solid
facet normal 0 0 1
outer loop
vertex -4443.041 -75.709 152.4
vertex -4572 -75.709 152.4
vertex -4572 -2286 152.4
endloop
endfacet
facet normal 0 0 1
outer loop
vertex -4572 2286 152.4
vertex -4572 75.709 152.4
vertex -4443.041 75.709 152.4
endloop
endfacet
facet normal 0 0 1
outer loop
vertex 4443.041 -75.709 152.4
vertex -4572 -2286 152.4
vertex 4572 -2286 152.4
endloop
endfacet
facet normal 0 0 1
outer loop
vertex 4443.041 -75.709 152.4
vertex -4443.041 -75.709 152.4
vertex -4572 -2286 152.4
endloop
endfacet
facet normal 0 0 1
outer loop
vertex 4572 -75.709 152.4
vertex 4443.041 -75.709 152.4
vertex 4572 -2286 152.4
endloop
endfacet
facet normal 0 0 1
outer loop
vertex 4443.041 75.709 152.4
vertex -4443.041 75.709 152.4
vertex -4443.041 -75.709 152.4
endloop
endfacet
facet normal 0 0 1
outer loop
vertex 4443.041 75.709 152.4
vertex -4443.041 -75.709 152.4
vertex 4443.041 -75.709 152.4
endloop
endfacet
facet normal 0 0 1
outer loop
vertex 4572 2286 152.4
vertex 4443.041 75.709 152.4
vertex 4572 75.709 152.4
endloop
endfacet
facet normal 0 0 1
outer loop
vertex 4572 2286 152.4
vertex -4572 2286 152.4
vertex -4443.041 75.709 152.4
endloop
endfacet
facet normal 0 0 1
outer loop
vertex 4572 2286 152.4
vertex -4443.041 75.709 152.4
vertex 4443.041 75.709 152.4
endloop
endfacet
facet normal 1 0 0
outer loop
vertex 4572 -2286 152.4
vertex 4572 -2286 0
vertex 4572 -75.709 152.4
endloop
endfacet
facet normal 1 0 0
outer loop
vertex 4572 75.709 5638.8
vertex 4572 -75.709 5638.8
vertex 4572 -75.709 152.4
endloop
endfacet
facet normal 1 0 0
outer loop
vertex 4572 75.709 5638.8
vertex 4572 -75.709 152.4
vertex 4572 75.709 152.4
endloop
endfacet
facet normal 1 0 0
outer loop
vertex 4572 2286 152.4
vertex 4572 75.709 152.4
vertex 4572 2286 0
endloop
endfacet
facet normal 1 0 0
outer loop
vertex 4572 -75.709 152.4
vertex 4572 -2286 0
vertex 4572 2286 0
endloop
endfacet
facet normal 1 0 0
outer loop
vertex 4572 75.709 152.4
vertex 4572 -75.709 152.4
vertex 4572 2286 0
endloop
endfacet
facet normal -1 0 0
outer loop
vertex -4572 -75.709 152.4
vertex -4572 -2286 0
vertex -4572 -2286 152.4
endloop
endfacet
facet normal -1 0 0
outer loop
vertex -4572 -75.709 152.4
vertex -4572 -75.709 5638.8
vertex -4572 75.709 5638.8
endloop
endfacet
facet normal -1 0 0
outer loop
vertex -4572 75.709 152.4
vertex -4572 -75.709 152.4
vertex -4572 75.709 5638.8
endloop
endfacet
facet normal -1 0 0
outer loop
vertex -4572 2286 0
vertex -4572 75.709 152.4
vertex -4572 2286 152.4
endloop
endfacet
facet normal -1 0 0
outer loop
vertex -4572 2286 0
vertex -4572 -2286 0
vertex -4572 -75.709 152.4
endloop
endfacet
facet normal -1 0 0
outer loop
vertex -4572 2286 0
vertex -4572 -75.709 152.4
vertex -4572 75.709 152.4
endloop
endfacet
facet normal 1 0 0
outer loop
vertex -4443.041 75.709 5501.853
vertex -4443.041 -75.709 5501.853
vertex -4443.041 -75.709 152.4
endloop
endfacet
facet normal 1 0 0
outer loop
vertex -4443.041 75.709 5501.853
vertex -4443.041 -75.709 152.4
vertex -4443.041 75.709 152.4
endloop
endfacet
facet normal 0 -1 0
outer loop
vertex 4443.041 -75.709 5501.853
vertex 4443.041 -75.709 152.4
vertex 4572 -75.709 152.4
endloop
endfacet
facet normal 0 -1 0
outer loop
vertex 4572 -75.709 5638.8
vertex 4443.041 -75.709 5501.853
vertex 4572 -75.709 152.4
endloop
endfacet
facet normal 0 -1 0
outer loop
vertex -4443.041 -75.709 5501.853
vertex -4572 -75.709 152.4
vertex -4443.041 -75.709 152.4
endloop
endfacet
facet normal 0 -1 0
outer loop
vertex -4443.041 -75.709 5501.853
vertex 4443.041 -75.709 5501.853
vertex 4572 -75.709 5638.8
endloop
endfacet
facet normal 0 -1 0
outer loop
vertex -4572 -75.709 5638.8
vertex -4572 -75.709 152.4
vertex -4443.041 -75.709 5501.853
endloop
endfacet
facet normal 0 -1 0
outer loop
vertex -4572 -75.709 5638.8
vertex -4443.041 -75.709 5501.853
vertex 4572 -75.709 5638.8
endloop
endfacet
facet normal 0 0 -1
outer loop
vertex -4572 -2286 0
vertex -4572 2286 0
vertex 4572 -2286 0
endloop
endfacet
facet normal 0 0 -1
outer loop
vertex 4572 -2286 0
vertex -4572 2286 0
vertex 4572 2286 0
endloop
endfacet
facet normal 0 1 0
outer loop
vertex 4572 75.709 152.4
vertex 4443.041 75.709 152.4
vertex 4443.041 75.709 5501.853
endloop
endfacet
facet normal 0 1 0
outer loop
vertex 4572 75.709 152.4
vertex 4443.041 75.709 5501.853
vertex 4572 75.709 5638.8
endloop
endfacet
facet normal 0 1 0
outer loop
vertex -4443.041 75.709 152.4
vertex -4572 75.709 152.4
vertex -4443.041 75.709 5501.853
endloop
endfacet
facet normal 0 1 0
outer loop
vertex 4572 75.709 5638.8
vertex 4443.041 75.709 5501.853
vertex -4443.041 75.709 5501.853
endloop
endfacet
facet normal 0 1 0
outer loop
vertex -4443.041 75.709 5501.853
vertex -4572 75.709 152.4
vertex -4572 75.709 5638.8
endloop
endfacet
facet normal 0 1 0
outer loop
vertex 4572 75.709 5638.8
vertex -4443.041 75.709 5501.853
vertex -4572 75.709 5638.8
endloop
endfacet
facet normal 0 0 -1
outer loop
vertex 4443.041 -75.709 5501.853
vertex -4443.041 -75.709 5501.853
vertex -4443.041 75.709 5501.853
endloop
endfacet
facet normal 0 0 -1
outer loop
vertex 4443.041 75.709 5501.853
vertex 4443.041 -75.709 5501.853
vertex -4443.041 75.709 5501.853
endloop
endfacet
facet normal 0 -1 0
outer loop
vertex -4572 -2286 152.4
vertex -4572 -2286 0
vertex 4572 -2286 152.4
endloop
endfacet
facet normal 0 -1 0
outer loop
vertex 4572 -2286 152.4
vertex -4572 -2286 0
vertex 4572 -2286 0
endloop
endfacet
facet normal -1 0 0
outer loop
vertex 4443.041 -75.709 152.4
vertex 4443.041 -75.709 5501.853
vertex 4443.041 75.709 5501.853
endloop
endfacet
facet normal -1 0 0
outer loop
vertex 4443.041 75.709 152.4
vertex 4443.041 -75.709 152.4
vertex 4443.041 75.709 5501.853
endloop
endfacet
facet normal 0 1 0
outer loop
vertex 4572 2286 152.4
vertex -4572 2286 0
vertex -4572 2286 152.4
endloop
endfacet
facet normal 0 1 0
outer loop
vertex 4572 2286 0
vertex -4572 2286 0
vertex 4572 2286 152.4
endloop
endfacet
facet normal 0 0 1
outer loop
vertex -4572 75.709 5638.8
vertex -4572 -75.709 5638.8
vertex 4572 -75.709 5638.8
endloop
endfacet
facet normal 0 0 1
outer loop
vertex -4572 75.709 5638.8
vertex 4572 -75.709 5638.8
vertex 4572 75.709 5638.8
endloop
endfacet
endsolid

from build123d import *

# Parameters (mm, degrees)
F0_W     = 9144
F0_H     = 4572
F1_DEPTH = 152.4
F2_W     = 128.9591522217
F2_H     = 151.4181494713
F3_DEPTH = 5486.4
F4_W     = 151.4181494713
F4_H     = 136.9470108032
F5_DEPTH = 8886.0816955566


# Not quite as in the source:
# - the program builds the solid bodies; features that only make, move or delete a surface that nothing else refers to are left out


with BuildPart() as f1:
    # F0 (on Top) → F1 (new body)
    with BuildSketch(Plane.XY):
        Rectangle(F0_W, F0_H)
    extrude(amount=F1_DEPTH)

    # F2 (on face) → F3 (join)
    with BuildSketch(Plane.XY.offset(152.4)):
        with Locations((-4507.5204238892, 0)):
            Rectangle(F2_W, F2_H)
        with Locations((4507.5204238892, 0)):
            Rectangle(F2_W, F2_H)
    extrude(amount=F3_DEPTH)

    # F4 (on face) → F5 (join, through all)
    with BuildSketch(Plane.YZ.offset(-4443.0408477783)):
        with Locations((0, 5570.3264945984)):
            Rectangle(F4_W, F4_H)
    extrude(amount=F5_DEPTH)


solid = f1.part
